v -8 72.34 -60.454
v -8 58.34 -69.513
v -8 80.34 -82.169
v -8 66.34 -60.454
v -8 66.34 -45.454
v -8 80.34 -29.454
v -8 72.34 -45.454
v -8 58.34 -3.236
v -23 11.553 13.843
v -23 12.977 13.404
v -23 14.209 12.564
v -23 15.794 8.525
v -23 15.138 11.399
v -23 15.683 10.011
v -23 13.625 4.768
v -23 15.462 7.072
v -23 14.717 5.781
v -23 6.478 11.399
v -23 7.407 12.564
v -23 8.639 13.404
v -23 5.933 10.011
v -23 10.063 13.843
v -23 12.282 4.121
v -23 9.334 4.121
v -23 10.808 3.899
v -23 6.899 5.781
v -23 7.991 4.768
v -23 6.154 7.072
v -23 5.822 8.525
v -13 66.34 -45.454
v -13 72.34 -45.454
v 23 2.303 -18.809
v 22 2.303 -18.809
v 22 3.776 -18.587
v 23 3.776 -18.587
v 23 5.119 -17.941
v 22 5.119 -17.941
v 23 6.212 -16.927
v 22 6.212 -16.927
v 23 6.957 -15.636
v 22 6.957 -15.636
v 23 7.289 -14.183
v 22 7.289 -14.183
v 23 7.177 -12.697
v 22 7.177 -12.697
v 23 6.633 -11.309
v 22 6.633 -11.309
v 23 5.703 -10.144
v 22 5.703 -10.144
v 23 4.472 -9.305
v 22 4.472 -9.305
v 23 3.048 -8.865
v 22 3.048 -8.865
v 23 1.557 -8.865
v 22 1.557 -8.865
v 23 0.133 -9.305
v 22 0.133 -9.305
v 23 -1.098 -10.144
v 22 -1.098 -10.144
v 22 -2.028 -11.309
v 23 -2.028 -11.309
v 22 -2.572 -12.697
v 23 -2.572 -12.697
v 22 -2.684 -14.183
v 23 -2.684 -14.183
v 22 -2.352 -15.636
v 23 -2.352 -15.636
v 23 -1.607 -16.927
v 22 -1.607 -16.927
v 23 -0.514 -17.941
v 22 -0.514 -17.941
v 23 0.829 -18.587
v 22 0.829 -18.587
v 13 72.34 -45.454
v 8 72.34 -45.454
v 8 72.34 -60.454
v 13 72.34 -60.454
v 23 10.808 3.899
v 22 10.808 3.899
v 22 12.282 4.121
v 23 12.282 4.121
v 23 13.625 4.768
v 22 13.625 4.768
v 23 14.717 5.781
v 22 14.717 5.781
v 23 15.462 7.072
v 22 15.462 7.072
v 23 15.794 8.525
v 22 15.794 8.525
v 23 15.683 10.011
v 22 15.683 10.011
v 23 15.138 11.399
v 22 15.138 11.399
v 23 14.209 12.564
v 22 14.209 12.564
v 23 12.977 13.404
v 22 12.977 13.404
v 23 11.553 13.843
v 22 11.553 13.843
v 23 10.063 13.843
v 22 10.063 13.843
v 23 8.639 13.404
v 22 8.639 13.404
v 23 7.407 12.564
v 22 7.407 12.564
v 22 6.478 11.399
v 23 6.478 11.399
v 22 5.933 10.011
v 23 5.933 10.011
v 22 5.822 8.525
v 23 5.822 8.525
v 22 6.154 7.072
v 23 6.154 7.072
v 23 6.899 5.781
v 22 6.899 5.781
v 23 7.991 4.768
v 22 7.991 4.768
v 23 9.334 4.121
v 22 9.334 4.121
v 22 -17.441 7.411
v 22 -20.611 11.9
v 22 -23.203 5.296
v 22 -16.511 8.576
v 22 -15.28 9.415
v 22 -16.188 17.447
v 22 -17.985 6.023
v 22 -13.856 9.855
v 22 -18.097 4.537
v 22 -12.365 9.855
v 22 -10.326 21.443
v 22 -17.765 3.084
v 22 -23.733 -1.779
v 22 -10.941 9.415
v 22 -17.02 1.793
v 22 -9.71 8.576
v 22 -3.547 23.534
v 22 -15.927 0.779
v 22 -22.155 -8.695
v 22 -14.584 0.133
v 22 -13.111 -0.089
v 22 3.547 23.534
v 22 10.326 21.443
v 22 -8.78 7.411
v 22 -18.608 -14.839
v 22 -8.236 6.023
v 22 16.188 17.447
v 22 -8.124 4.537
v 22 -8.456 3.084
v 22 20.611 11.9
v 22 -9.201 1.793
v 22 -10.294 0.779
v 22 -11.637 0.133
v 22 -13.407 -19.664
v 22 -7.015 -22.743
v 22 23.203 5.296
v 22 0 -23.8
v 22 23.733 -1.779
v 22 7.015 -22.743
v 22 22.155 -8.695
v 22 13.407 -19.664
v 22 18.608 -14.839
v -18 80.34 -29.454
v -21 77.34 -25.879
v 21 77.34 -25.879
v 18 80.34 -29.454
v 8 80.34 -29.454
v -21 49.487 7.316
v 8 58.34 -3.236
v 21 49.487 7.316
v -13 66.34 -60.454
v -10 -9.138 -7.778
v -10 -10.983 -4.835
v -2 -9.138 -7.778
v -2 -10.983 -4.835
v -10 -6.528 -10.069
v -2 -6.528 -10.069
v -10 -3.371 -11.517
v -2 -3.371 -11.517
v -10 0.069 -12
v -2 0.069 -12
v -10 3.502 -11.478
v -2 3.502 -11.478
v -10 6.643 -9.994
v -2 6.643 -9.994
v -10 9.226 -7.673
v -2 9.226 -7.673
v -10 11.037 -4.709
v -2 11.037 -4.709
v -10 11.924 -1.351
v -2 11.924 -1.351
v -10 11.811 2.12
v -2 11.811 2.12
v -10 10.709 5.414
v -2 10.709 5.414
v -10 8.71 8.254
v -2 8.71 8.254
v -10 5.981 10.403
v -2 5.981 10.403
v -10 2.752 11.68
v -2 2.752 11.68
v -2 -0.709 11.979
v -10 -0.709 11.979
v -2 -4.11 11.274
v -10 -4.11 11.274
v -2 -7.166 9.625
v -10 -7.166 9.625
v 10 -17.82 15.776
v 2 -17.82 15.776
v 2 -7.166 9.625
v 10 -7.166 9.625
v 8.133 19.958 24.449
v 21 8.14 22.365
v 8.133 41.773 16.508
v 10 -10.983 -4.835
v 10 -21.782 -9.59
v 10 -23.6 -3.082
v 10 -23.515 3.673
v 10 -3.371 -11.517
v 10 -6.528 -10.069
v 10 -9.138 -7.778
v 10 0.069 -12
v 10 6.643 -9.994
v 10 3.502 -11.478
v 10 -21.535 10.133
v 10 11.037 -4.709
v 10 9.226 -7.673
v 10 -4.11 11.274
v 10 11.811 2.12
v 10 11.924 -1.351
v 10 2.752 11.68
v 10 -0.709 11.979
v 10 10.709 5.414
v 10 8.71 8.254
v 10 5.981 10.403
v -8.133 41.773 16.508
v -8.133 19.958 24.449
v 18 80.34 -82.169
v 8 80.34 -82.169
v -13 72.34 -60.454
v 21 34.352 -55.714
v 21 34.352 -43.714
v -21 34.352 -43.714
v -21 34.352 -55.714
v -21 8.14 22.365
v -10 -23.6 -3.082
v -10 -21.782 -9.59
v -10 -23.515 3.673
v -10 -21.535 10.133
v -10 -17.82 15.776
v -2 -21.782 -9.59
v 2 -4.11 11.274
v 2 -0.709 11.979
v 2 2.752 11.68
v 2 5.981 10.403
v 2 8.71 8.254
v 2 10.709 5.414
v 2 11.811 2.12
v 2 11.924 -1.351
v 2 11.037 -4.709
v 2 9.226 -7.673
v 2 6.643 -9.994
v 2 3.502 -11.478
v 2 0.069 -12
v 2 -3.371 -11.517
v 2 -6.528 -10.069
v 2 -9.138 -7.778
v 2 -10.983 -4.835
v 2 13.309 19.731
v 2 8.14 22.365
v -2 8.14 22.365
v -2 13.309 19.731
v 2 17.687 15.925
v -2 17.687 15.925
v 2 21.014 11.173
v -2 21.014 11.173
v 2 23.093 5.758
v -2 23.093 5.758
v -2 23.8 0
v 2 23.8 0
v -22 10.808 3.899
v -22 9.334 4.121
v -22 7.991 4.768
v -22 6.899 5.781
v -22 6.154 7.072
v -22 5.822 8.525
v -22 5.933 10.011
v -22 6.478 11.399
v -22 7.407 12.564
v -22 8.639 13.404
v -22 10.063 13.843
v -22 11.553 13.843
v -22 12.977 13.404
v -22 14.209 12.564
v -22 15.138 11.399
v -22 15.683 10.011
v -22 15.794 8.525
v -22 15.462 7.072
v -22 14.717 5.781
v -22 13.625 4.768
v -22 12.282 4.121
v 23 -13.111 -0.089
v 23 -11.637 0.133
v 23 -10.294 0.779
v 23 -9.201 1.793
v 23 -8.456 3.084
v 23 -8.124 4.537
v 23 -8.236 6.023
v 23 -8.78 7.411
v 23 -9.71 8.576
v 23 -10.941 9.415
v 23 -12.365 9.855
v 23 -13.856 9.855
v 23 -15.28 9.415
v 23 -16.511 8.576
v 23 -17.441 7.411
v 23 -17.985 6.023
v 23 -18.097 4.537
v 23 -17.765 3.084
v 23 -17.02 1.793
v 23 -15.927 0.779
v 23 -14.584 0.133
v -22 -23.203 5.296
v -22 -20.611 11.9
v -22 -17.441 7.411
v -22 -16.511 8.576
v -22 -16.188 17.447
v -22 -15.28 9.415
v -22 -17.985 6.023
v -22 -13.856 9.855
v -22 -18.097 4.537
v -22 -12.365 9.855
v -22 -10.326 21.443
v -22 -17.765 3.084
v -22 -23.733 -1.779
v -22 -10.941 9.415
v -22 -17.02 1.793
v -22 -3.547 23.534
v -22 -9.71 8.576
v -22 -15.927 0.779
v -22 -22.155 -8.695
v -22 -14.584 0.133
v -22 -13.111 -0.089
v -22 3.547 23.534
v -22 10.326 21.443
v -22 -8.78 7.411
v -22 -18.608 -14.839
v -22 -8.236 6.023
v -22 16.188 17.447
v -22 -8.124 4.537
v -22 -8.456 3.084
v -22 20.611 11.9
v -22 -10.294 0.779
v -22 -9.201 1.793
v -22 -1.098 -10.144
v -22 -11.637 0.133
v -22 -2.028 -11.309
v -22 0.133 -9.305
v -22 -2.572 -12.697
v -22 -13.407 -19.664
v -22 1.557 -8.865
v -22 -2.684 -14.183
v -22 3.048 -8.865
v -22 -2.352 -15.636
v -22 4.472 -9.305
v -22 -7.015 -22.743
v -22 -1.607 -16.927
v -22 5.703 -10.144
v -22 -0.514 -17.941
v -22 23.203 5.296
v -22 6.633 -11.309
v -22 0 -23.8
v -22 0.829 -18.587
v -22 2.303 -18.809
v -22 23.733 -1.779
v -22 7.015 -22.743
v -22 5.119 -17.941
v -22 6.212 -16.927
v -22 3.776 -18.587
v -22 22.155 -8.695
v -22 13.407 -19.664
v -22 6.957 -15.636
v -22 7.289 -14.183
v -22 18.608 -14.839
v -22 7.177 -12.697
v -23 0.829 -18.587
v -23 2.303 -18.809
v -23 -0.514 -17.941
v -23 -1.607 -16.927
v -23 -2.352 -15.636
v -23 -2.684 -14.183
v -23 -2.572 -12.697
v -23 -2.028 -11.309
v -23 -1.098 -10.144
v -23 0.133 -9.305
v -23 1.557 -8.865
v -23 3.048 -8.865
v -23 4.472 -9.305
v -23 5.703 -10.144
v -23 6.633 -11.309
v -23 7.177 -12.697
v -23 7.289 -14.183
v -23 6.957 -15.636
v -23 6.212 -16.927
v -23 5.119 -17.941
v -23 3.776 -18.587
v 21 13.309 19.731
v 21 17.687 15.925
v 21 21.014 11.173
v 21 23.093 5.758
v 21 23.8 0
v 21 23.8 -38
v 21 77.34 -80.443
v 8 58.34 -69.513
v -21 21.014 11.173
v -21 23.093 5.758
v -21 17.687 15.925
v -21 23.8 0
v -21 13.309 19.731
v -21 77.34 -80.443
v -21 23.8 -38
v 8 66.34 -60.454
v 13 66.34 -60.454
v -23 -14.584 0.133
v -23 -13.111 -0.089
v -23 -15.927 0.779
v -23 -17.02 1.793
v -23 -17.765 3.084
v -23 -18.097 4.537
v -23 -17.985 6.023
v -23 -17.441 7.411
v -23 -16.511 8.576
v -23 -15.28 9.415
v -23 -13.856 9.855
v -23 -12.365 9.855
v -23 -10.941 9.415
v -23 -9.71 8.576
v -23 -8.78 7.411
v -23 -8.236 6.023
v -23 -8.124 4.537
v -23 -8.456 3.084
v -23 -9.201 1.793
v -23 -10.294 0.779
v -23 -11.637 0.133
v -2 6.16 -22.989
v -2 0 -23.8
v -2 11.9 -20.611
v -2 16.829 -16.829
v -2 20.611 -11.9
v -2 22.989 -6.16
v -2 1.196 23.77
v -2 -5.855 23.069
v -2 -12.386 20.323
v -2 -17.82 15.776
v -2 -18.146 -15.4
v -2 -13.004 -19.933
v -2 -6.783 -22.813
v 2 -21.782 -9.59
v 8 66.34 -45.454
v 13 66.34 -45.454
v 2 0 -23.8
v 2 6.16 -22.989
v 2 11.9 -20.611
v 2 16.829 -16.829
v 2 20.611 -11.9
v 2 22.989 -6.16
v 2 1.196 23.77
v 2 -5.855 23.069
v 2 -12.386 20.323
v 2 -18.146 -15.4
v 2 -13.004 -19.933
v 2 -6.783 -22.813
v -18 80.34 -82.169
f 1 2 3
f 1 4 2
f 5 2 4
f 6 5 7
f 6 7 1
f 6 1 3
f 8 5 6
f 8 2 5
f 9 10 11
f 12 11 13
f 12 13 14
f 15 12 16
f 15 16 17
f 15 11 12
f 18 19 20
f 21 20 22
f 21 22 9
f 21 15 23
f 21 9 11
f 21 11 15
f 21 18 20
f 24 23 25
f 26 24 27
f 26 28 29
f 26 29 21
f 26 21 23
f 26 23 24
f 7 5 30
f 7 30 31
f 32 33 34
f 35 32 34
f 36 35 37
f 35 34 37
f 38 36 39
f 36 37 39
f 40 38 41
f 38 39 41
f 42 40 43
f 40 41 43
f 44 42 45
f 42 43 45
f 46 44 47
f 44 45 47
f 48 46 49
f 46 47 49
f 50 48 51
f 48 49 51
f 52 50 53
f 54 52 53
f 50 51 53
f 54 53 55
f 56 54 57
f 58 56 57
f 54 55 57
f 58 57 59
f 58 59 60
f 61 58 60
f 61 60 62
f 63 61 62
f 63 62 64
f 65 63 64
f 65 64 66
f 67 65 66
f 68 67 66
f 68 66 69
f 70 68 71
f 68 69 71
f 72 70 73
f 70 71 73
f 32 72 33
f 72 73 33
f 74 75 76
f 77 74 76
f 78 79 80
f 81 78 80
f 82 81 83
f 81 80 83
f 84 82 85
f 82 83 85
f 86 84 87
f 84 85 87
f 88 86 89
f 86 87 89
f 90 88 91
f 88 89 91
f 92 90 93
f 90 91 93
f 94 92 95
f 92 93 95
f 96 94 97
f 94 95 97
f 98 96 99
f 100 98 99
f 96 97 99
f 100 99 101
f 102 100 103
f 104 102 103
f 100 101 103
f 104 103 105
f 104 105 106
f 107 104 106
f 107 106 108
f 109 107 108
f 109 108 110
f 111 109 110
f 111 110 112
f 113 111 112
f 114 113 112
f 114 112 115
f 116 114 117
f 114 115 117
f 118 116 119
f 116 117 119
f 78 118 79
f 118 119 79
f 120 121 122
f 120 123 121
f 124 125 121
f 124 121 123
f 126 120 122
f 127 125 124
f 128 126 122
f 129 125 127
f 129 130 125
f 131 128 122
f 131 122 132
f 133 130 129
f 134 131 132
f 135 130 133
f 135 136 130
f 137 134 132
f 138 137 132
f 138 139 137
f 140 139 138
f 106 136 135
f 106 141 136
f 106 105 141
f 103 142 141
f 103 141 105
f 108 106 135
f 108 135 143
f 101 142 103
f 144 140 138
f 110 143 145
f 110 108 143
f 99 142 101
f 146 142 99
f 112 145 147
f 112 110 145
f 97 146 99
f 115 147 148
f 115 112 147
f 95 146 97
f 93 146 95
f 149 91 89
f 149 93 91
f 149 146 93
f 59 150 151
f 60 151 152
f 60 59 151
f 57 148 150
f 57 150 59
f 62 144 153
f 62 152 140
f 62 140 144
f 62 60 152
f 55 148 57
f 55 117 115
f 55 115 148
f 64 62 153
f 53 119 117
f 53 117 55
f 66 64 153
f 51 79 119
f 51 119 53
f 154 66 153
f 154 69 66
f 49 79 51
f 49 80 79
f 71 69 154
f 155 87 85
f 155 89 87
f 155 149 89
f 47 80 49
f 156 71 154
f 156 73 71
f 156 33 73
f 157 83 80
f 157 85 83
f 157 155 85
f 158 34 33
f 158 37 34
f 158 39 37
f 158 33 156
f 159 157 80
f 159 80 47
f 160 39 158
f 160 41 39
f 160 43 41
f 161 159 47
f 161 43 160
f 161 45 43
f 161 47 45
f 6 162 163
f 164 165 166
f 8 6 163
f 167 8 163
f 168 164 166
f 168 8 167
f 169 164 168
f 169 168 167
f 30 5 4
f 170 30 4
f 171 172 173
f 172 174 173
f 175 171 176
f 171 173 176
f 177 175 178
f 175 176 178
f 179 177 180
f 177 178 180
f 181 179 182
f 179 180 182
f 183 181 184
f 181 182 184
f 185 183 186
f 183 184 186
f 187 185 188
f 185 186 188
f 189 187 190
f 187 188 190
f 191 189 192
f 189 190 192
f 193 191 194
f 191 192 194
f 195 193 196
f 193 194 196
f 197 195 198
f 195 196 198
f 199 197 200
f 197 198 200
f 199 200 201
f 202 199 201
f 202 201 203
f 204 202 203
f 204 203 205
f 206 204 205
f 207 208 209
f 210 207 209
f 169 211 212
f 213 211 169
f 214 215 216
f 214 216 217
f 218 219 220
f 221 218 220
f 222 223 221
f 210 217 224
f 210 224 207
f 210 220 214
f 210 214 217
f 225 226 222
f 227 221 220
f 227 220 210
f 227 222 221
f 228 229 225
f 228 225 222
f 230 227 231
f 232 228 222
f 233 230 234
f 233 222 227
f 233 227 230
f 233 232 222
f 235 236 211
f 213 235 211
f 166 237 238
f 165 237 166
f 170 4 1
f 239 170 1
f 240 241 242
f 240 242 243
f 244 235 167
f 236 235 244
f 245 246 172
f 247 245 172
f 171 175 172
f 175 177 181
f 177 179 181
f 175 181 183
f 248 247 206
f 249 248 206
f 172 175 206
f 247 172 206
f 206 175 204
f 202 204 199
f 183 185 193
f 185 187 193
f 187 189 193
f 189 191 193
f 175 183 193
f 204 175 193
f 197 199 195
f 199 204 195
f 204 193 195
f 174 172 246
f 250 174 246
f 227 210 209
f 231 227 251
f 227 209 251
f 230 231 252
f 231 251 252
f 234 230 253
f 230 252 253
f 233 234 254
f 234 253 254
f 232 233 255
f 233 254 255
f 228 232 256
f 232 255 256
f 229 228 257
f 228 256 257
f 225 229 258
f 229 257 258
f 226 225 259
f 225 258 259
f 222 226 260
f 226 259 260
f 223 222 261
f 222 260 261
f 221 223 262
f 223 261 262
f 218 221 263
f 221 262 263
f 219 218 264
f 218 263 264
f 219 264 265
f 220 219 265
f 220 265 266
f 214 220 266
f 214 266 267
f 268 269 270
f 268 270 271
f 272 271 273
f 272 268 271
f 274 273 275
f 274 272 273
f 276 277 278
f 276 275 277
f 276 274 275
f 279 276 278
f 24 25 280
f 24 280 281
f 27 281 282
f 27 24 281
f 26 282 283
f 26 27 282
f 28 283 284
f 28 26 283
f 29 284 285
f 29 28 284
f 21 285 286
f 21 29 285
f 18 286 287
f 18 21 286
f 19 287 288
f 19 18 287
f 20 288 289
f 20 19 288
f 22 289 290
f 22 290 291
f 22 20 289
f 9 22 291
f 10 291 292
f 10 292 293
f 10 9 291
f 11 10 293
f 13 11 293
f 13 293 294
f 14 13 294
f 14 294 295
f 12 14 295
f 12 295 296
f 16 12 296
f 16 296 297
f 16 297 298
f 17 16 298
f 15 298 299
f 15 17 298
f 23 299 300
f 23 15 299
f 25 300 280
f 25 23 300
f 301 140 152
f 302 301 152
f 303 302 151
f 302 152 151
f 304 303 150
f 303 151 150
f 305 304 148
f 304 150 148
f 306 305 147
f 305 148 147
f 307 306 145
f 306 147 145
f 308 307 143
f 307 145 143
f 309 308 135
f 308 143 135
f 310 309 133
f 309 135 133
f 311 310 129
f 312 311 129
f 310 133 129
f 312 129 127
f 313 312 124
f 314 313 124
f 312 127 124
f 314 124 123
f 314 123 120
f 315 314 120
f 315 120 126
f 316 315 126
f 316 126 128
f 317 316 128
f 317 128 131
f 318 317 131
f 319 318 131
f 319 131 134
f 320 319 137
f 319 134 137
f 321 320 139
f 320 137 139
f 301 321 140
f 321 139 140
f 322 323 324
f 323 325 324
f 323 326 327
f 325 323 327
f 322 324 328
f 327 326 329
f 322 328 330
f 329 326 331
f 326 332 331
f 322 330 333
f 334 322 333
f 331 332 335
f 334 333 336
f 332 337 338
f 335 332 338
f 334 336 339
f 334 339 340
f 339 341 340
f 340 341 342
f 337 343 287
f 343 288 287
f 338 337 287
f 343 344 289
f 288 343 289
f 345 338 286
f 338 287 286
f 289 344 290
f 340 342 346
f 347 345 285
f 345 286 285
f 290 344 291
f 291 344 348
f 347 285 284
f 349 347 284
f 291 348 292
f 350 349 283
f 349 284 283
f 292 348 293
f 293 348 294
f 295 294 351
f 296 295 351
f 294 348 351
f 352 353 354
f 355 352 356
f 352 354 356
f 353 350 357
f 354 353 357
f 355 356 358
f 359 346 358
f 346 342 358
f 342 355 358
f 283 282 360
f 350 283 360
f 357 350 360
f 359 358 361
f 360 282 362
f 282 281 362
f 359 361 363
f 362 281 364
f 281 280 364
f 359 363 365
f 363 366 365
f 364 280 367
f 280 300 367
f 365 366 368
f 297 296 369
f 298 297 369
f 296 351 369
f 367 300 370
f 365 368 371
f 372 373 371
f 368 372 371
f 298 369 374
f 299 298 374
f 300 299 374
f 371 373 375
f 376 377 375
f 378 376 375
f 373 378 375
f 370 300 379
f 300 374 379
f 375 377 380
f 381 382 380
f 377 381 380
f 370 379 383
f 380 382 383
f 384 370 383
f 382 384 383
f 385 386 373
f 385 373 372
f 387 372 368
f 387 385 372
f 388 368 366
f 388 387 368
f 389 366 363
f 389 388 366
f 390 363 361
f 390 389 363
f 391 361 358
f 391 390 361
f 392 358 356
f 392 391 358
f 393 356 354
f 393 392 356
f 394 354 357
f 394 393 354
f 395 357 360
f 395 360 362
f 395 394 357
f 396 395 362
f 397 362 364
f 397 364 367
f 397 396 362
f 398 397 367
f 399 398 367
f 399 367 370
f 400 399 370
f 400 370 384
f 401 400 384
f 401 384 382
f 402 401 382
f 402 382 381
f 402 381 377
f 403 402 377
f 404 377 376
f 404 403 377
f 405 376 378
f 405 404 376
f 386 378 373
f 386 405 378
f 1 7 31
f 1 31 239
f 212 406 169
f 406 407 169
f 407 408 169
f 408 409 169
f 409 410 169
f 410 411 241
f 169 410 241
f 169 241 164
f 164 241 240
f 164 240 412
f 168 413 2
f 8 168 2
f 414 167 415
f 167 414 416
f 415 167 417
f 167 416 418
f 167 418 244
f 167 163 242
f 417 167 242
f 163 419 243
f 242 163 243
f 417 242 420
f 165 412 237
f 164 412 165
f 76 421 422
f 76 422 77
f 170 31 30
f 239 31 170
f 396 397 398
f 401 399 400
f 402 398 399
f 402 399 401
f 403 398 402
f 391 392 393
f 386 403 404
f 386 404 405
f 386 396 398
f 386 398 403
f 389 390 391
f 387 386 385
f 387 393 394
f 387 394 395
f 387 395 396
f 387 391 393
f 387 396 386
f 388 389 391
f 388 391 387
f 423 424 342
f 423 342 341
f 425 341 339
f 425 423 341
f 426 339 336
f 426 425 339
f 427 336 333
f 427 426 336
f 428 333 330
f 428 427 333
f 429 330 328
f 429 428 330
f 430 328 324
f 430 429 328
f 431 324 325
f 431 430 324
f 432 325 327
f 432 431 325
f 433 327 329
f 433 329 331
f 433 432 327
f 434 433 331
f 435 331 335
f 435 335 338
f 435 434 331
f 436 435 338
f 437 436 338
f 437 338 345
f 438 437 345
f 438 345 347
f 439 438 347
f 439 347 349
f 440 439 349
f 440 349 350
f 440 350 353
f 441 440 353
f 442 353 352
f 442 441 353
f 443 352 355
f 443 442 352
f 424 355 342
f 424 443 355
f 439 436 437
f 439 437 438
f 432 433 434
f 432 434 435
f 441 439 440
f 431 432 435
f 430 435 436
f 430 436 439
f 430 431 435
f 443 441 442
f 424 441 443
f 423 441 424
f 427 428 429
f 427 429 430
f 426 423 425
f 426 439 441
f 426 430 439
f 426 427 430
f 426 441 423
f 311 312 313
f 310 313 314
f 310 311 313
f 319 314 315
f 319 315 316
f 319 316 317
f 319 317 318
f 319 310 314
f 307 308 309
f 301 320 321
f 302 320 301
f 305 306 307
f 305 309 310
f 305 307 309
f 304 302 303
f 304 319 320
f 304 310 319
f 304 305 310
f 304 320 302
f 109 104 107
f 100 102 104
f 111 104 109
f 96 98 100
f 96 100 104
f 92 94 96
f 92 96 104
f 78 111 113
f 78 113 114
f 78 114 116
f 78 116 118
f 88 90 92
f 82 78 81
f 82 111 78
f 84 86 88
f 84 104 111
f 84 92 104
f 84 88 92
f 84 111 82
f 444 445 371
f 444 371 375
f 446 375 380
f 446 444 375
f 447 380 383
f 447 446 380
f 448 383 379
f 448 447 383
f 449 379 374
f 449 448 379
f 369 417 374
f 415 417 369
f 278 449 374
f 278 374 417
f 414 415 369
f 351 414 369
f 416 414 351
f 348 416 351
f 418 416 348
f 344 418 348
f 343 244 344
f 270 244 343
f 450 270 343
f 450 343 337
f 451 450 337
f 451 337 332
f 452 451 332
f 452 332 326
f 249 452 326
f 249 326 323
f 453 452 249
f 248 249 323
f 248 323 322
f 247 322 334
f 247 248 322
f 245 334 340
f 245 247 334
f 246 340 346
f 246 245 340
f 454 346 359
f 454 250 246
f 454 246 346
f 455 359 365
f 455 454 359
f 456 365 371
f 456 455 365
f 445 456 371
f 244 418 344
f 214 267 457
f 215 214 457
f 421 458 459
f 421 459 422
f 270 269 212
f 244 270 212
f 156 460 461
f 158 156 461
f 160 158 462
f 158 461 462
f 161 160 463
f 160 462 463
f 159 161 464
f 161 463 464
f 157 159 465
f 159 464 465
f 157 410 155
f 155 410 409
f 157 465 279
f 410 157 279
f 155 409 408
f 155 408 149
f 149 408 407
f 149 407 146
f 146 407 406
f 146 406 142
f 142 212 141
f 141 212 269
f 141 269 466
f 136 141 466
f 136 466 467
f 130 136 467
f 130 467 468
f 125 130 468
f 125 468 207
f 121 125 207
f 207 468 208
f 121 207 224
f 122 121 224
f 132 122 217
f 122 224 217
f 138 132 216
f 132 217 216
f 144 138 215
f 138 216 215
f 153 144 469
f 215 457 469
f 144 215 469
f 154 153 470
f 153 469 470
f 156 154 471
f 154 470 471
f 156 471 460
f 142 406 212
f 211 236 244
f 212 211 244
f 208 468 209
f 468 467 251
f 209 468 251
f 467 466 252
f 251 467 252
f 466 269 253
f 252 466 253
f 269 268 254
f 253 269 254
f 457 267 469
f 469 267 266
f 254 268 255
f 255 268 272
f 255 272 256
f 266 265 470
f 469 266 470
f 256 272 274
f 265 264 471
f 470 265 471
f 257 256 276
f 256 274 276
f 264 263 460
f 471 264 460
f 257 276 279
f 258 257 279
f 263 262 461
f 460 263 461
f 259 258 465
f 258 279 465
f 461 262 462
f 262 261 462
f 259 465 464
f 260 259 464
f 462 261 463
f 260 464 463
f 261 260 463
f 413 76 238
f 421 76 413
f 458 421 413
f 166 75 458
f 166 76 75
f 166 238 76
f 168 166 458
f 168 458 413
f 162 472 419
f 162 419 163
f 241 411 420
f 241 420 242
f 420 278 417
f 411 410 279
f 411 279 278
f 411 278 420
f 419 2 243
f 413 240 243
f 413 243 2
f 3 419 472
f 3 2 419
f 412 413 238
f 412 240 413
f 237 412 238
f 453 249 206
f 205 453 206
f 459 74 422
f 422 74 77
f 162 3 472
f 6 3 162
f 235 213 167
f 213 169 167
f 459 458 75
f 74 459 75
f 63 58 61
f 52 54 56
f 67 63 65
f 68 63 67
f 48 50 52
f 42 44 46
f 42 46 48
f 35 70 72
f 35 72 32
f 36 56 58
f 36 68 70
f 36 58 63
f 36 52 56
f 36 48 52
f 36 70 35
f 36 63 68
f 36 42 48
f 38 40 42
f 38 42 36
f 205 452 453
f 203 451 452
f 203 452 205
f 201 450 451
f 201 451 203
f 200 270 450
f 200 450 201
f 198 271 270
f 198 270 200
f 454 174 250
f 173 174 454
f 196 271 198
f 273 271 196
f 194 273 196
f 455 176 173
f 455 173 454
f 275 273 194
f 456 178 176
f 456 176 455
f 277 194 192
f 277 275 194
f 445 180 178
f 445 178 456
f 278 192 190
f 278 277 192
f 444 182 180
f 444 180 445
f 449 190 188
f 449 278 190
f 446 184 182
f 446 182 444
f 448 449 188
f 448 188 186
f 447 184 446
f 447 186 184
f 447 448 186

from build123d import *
from OCP.BRepFilletAPI import BRepFilletAPI_MakeChamfer

# Parameters (mm, degrees)
BOSS_EXTRUDE1_START     = 1
SKETCH1_R               = 11.9
BOSS_EXTRUDE1_DEPTH     = 10
BOSS_EXTRUDE3_START     = -1
SKETCH1_3_R             = 11.9
BOSS_EXTRUDE3_DEPTH     = 10
SKETCH3_R               = 6
CUT_EXTRUDE1_DEPTH      = 4
SKETCH4_R               = 6
CUT_EXTRUDE2_DEPTH      = 4
BOSS_EXTRUDE9_DEPTH     = 10.5
BOSS_EXTRUDE10_DEPTH    = 3
CHAMFER4_SIZE           = 3
CHAMFER4_SIZE_2         = 5.196152423
CHAMFER5_SIZE           = 3
CHAMFER5_SIZE2          = 6.433520761528718
SKETCH17_R              = 2.500000000000001
SKETCH17_R_2            = 2.500000000000368
SKETCH17_R_3            = 2.5000000000002682
BOSS_EXTRUDE11_DEPTH    = 0.5
BOSS_EXTRUDE12_START    = 0.5
SKETCH18_R              = 2.5000000000000013
SKETCH18_R_2            = 2.5000000000003686
SKETCH18_R_3            = 2.500000000000268
BOSS_EXTRUDE12_DEPTH    = 0.5
CUT_EXTRUDE4_DEPTH      = 59.59880616896635
CHAMFER6_SIZE           = 1.5
SCALE1_SCALE            = 2
SKETCH20_W              = 15
SKETCH20_H              = 6
CUT_EXTRUDE5_DEPTH      = 5
CUT_EXTRUDE8_DEPTH      = 12
CUT_EXTRUDE8_DEPTH_BACK = 8


with BuildPart() as part:
    # Sketch1 → Boss-Extrude1 (new body)
    with BuildSketch(Plane(origin=(0, 0, 0), x_dir=(0, 0, -1), z_dir=(1, 0, 0)).offset(BOSS_EXTRUDE1_START)):
        Circle(SKETCH1_R)
    extrude(amount=BOSS_EXTRUDE1_DEPTH)

    # Sketch4 → Cut-Extrude2 (cut)
    with BuildSketch(Plane.ZY.offset(-1)):
        with Locations(Location((0, 0, 0), (0, 0, 180))):
            Circle(SKETCH4_R)
    extrude(amount=-CUT_EXTRUDE2_DEPTH, mode=Mode.SUBTRACT)



with BuildPart() as body_2:
    # Sketch1<3> → Boss-Extrude3 (new body)
    with BuildSketch(Plane(origin=(0, 0, 0), x_dir=(0, 0, -1), z_dir=(1, 0, 0)).offset(BOSS_EXTRUDE3_START)):
        Circle(SKETCH1_3_R)
    extrude(amount=-BOSS_EXTRUDE3_DEPTH)

    # Sketch3 → Cut-Extrude1 (cut)
    with BuildSketch(Plane(origin=(-1, 0, 0), x_dir=(0, 0, -1), z_dir=(1, 0, 0))):
        Circle(SKETCH3_R)
    extrude(amount=-CUT_EXTRUDE1_DEPTH, mode=Mode.SUBTRACT)


with BuildPart() as part_1:
    add(part.part)

    add(body_2.part)  # Boss-Extrude9 merges body 2
    # Sketch15 → Boss-Extrude9 (add, symmetric)
    with BuildSketch(Plane(origin=(0, 0, 0), x_dir=(0, 0, -1), z_dir=(1, 0, 0))):
        with BuildLine():
            Line((0, 11.9), (19, 11.9))
            Line((19, 11.9), (21.856908233869017, 17.17617999534241))
            Line((21.856908233869017, 17.17617999534241), (27.856908233869014, 17.176179995342412))
            Line((27.856908233869014, 17.176179995342412), (41.084385398468356, 40.17017999534242))
            Line((41.084385398468356, 40.17017999534242), (14.727167600667759, 40.170179995342416))
            Line((14.727167600667759, 40.170179995342416), (-3.657899034187683, 24.74327736286543))
            Line((-3.657899034187683, 24.74327736286543), (-11.182342187352324, 4.070039705575419))
            ThreePointArc((-11.182342187352324, 4.070039705575419), (-6.825559592577466, 9.74790932703899), (0, 11.9))
        make_face()
    extrude(amount=BOSS_EXTRUDE9_DEPTH, both=True)

    # Sketch16 → Boss-Extrude10 (add)
    with BuildSketch(Plane(origin=(0, 4.0700397055754225, 11.182342187352331), x_dir=(1, 0, 0), z_dir=(0, 0.34202014332566566, 0.9396926207859096))):
        Polygon((-10.5, 22.000000000000004), (-10.5, -1.3e-15), (-1, 0), (1, 0), (10.5, -1.3e-15), (10.5, 22.000000000000004), align=None)
    extrude(amount=BOSS_EXTRUDE10_DEPTH)

    # Chamfer4
    chamfer4_edges_1 = [part_1.edges().sort_by_distance(p)[0] for p in [
        (0, 5.096100135552418, 14.00142004971006),
    ]]
    chamfer4_side_1 = [part_1.faces().sort_by_distance(p)[0] for p in [
        (0, 5.075578926952878, 13.945038492462905),
    ]]
    chamfer4_edges_2 = [part_1.edges().sort_by_distance(p)[0] for p in [
        (0, 25.769337792842435, 6.4769768965454135),
    ]]
    chamfer4_side_2 = [part_1.faces().sort_by_distance(p)[0] for p in [
        (0, 25.712956235595282, 6.497498105144953),
    ]]
    chamfer4 = BRepFilletAPI_MakeChamfer(part_1.part.solid().wrapped)
    for e in chamfer4_edges_1:
        chamfer4.Add(CHAMFER4_SIZE - 0.0001, CHAMFER4_SIZE_2 - 0.0001, e.wrapped, chamfer4_side_1[0].wrapped)
    for e in chamfer4_edges_2:
        chamfer4.Add(CHAMFER4_SIZE_2 - 0.0001, CHAMFER4_SIZE - 0.0001, e.wrapped, chamfer4_side_2[0].wrapped)
    add(Compound.cast(chamfer4.Shape()), mode=Mode.REPLACE)  # a hair under: the kernel refuses the full size

    # Chamfer5: one chamfer whose edges measure the first distance from different faces: ONE call of the kernel's chamfer builder (chamfer() names one face for all edges)
    chamfer5_edges_1 = [part_1.edges().sort_by_distance(p)[0] for p in [
        (-10.5, 15.432718964197425, 10.239198473127738),
    ]]
    chamfer5_side_1 = [part_1.faces().sort_by_distance(p)[0] for p in [
        (-10.5, 25.100235238560476, -14.351576366544348),
    ]]
    chamfer5_edges_2 = [part_1.edges().sort_by_distance(p)[0] for p in [
        (10.5, 15.432718964197427, 10.239198473127736),
    ]]
    chamfer5_side_2 = [part_1.faces().sort_by_distance(p)[0] for p in [
        (10.5, 25.100235238560483, -14.35157636654435),
    ]]
    chamfer5 = BRepFilletAPI_MakeChamfer(part_1.part.solid().wrapped)
    for e in chamfer5_edges_1:
        chamfer5.Add(CHAMFER5_SIZE, CHAMFER5_SIZE2, e.wrapped, chamfer5_side_1[0].wrapped)  # the first distance lies on this face
    for e in chamfer5_edges_2:
        chamfer5.Add(CHAMFER5_SIZE, CHAMFER5_SIZE2, e.wrapped, chamfer5_side_2[0].wrapped)  # the first distance lies on this face
    add(Compound.cast(chamfer5.Shape()), mode=Mode.REPLACE)

    # Sketch17 → Boss-Extrude11 (add)
    with BuildSketch(Plane(origin=(11, 0, 0), x_dir=(0, 0, -1), z_dir=(1, 0, 0))):
        with Locations((-4.449357706456068, 5.404)):
            Circle(SKETCH17_R)
        with Locations((6.9046801352792615, 1.1512568043153382)):
            Circle(SKETCH17_R_2)
        with Locations((-2.4553224288227398, -6.5552568043149675)):
            Circle(SKETCH17_R_3)
    extrude(amount=BOSS_EXTRUDE11_DEPTH)

    # Sketch18 → Boss-Extrude12 (add)
    with BuildSketch(Plane.ZY.offset(11).offset(BOSS_EXTRUDE12_START)):
        with Locations(Location((4.449357706456068, 5.404, 0), (0, 0, 180))):
            Circle(SKETCH18_R)
        with Locations(Location((-6.9046801352792615, 1.1512568043153382, 0), (0, 0, 180))):
            Circle(SKETCH18_R_2)
        with Locations(Location((2.4553224288227398, -6.5552568043149675, 0), (0, 0, 180))):
            Circle(SKETCH18_R_3)
    extrude(amount=-BOSS_EXTRUDE12_DEPTH)

    # Sketch19 → Cut-Extrude4 (cut, through all)
    with BuildSketch(Plane.XY):
        Polygon((-4.000000000000002, 40.170179995342416), (4.000000000000002, 40.170179995342416), (4, 29.170179995342412), (-4, 29.170179995342412), align=None)
    extrude(amount=-CUT_EXTRUDE4_DEPTH, mode=Mode.SUBTRACT)

    # Chamfer6
    chamfer6_edges = [part_1.edges().sort_by_distance(p)[0] for p in [
        (-10.5, 40.17017999534242, -27.905776499568056),
        (10.5, 40.17017999534242, -27.905776499568056),
    ]]
    chamfer(chamfer6_edges, length=CHAMFER6_SIZE)


with BuildPart() as part_2:
    # Scale1: scaled about (0, 0, 0)
    add(part_1.part.scale(SCALE1_SCALE))

    # Sketch20 → Cut-Extrude5 (cut)
    with BuildSketch(Plane(origin=(-7.999999999999991, -1.26e-15, 0), x_dir=(0, 0, -1), z_dir=(1, 1.6e-16, 0))):
        with Locations((52.95433520133552, 69.34035999068483)):
            Rectangle(SKETCH20_W, SKETCH20_H)
    cut_extrude5 = extrude(amount=-CUT_EXTRUDE5_DEPTH, mode=Mode.SUBTRACT)

    # Mirror4: Cut-Extrude5 across plane
    add(cut_extrude5.mirror(Plane(origin=(0, 0, 0), x_dir=(0, 0, 1), z_dir=(1, 0, 0))), mode=Mode.SUBTRACT)

    # Sketch21 → Cut-Extrude8 (cut, two sides: drawn at the far end of the back side and taken through both)
    with BuildSketch(Plane(origin=(-2, 0, 0), x_dir=(0, 0, -1), z_dir=(1, 0, 0)).offset(-CUT_EXTRUDE8_DEPTH_BACK)):
        with BuildLine():
            Line((4.835188897605762, -10.982756863578018), (9.589791313584762, -21.78246777942974))
            ThreePointArc((9.589791313584762, -21.78246777942974), (-3.6733884927618106, -23.514808461504543), (-15.776309939282067, -17.819877796991495))
            Line((-15.776309939282067, -17.819877796991495), (-9.625245425797857, -7.166215911703854))
            ThreePointArc((-9.625245425797857, -7.166215911703854), (-3.062295967922119, -11.60268690454276), (4.835188897605762, -10.982756863578018))
        make_face()
    extrude(amount=CUT_EXTRUDE8_DEPTH + CUT_EXTRUDE8_DEPTH_BACK, mode=Mode.SUBTRACT)


solid = part_2.part
